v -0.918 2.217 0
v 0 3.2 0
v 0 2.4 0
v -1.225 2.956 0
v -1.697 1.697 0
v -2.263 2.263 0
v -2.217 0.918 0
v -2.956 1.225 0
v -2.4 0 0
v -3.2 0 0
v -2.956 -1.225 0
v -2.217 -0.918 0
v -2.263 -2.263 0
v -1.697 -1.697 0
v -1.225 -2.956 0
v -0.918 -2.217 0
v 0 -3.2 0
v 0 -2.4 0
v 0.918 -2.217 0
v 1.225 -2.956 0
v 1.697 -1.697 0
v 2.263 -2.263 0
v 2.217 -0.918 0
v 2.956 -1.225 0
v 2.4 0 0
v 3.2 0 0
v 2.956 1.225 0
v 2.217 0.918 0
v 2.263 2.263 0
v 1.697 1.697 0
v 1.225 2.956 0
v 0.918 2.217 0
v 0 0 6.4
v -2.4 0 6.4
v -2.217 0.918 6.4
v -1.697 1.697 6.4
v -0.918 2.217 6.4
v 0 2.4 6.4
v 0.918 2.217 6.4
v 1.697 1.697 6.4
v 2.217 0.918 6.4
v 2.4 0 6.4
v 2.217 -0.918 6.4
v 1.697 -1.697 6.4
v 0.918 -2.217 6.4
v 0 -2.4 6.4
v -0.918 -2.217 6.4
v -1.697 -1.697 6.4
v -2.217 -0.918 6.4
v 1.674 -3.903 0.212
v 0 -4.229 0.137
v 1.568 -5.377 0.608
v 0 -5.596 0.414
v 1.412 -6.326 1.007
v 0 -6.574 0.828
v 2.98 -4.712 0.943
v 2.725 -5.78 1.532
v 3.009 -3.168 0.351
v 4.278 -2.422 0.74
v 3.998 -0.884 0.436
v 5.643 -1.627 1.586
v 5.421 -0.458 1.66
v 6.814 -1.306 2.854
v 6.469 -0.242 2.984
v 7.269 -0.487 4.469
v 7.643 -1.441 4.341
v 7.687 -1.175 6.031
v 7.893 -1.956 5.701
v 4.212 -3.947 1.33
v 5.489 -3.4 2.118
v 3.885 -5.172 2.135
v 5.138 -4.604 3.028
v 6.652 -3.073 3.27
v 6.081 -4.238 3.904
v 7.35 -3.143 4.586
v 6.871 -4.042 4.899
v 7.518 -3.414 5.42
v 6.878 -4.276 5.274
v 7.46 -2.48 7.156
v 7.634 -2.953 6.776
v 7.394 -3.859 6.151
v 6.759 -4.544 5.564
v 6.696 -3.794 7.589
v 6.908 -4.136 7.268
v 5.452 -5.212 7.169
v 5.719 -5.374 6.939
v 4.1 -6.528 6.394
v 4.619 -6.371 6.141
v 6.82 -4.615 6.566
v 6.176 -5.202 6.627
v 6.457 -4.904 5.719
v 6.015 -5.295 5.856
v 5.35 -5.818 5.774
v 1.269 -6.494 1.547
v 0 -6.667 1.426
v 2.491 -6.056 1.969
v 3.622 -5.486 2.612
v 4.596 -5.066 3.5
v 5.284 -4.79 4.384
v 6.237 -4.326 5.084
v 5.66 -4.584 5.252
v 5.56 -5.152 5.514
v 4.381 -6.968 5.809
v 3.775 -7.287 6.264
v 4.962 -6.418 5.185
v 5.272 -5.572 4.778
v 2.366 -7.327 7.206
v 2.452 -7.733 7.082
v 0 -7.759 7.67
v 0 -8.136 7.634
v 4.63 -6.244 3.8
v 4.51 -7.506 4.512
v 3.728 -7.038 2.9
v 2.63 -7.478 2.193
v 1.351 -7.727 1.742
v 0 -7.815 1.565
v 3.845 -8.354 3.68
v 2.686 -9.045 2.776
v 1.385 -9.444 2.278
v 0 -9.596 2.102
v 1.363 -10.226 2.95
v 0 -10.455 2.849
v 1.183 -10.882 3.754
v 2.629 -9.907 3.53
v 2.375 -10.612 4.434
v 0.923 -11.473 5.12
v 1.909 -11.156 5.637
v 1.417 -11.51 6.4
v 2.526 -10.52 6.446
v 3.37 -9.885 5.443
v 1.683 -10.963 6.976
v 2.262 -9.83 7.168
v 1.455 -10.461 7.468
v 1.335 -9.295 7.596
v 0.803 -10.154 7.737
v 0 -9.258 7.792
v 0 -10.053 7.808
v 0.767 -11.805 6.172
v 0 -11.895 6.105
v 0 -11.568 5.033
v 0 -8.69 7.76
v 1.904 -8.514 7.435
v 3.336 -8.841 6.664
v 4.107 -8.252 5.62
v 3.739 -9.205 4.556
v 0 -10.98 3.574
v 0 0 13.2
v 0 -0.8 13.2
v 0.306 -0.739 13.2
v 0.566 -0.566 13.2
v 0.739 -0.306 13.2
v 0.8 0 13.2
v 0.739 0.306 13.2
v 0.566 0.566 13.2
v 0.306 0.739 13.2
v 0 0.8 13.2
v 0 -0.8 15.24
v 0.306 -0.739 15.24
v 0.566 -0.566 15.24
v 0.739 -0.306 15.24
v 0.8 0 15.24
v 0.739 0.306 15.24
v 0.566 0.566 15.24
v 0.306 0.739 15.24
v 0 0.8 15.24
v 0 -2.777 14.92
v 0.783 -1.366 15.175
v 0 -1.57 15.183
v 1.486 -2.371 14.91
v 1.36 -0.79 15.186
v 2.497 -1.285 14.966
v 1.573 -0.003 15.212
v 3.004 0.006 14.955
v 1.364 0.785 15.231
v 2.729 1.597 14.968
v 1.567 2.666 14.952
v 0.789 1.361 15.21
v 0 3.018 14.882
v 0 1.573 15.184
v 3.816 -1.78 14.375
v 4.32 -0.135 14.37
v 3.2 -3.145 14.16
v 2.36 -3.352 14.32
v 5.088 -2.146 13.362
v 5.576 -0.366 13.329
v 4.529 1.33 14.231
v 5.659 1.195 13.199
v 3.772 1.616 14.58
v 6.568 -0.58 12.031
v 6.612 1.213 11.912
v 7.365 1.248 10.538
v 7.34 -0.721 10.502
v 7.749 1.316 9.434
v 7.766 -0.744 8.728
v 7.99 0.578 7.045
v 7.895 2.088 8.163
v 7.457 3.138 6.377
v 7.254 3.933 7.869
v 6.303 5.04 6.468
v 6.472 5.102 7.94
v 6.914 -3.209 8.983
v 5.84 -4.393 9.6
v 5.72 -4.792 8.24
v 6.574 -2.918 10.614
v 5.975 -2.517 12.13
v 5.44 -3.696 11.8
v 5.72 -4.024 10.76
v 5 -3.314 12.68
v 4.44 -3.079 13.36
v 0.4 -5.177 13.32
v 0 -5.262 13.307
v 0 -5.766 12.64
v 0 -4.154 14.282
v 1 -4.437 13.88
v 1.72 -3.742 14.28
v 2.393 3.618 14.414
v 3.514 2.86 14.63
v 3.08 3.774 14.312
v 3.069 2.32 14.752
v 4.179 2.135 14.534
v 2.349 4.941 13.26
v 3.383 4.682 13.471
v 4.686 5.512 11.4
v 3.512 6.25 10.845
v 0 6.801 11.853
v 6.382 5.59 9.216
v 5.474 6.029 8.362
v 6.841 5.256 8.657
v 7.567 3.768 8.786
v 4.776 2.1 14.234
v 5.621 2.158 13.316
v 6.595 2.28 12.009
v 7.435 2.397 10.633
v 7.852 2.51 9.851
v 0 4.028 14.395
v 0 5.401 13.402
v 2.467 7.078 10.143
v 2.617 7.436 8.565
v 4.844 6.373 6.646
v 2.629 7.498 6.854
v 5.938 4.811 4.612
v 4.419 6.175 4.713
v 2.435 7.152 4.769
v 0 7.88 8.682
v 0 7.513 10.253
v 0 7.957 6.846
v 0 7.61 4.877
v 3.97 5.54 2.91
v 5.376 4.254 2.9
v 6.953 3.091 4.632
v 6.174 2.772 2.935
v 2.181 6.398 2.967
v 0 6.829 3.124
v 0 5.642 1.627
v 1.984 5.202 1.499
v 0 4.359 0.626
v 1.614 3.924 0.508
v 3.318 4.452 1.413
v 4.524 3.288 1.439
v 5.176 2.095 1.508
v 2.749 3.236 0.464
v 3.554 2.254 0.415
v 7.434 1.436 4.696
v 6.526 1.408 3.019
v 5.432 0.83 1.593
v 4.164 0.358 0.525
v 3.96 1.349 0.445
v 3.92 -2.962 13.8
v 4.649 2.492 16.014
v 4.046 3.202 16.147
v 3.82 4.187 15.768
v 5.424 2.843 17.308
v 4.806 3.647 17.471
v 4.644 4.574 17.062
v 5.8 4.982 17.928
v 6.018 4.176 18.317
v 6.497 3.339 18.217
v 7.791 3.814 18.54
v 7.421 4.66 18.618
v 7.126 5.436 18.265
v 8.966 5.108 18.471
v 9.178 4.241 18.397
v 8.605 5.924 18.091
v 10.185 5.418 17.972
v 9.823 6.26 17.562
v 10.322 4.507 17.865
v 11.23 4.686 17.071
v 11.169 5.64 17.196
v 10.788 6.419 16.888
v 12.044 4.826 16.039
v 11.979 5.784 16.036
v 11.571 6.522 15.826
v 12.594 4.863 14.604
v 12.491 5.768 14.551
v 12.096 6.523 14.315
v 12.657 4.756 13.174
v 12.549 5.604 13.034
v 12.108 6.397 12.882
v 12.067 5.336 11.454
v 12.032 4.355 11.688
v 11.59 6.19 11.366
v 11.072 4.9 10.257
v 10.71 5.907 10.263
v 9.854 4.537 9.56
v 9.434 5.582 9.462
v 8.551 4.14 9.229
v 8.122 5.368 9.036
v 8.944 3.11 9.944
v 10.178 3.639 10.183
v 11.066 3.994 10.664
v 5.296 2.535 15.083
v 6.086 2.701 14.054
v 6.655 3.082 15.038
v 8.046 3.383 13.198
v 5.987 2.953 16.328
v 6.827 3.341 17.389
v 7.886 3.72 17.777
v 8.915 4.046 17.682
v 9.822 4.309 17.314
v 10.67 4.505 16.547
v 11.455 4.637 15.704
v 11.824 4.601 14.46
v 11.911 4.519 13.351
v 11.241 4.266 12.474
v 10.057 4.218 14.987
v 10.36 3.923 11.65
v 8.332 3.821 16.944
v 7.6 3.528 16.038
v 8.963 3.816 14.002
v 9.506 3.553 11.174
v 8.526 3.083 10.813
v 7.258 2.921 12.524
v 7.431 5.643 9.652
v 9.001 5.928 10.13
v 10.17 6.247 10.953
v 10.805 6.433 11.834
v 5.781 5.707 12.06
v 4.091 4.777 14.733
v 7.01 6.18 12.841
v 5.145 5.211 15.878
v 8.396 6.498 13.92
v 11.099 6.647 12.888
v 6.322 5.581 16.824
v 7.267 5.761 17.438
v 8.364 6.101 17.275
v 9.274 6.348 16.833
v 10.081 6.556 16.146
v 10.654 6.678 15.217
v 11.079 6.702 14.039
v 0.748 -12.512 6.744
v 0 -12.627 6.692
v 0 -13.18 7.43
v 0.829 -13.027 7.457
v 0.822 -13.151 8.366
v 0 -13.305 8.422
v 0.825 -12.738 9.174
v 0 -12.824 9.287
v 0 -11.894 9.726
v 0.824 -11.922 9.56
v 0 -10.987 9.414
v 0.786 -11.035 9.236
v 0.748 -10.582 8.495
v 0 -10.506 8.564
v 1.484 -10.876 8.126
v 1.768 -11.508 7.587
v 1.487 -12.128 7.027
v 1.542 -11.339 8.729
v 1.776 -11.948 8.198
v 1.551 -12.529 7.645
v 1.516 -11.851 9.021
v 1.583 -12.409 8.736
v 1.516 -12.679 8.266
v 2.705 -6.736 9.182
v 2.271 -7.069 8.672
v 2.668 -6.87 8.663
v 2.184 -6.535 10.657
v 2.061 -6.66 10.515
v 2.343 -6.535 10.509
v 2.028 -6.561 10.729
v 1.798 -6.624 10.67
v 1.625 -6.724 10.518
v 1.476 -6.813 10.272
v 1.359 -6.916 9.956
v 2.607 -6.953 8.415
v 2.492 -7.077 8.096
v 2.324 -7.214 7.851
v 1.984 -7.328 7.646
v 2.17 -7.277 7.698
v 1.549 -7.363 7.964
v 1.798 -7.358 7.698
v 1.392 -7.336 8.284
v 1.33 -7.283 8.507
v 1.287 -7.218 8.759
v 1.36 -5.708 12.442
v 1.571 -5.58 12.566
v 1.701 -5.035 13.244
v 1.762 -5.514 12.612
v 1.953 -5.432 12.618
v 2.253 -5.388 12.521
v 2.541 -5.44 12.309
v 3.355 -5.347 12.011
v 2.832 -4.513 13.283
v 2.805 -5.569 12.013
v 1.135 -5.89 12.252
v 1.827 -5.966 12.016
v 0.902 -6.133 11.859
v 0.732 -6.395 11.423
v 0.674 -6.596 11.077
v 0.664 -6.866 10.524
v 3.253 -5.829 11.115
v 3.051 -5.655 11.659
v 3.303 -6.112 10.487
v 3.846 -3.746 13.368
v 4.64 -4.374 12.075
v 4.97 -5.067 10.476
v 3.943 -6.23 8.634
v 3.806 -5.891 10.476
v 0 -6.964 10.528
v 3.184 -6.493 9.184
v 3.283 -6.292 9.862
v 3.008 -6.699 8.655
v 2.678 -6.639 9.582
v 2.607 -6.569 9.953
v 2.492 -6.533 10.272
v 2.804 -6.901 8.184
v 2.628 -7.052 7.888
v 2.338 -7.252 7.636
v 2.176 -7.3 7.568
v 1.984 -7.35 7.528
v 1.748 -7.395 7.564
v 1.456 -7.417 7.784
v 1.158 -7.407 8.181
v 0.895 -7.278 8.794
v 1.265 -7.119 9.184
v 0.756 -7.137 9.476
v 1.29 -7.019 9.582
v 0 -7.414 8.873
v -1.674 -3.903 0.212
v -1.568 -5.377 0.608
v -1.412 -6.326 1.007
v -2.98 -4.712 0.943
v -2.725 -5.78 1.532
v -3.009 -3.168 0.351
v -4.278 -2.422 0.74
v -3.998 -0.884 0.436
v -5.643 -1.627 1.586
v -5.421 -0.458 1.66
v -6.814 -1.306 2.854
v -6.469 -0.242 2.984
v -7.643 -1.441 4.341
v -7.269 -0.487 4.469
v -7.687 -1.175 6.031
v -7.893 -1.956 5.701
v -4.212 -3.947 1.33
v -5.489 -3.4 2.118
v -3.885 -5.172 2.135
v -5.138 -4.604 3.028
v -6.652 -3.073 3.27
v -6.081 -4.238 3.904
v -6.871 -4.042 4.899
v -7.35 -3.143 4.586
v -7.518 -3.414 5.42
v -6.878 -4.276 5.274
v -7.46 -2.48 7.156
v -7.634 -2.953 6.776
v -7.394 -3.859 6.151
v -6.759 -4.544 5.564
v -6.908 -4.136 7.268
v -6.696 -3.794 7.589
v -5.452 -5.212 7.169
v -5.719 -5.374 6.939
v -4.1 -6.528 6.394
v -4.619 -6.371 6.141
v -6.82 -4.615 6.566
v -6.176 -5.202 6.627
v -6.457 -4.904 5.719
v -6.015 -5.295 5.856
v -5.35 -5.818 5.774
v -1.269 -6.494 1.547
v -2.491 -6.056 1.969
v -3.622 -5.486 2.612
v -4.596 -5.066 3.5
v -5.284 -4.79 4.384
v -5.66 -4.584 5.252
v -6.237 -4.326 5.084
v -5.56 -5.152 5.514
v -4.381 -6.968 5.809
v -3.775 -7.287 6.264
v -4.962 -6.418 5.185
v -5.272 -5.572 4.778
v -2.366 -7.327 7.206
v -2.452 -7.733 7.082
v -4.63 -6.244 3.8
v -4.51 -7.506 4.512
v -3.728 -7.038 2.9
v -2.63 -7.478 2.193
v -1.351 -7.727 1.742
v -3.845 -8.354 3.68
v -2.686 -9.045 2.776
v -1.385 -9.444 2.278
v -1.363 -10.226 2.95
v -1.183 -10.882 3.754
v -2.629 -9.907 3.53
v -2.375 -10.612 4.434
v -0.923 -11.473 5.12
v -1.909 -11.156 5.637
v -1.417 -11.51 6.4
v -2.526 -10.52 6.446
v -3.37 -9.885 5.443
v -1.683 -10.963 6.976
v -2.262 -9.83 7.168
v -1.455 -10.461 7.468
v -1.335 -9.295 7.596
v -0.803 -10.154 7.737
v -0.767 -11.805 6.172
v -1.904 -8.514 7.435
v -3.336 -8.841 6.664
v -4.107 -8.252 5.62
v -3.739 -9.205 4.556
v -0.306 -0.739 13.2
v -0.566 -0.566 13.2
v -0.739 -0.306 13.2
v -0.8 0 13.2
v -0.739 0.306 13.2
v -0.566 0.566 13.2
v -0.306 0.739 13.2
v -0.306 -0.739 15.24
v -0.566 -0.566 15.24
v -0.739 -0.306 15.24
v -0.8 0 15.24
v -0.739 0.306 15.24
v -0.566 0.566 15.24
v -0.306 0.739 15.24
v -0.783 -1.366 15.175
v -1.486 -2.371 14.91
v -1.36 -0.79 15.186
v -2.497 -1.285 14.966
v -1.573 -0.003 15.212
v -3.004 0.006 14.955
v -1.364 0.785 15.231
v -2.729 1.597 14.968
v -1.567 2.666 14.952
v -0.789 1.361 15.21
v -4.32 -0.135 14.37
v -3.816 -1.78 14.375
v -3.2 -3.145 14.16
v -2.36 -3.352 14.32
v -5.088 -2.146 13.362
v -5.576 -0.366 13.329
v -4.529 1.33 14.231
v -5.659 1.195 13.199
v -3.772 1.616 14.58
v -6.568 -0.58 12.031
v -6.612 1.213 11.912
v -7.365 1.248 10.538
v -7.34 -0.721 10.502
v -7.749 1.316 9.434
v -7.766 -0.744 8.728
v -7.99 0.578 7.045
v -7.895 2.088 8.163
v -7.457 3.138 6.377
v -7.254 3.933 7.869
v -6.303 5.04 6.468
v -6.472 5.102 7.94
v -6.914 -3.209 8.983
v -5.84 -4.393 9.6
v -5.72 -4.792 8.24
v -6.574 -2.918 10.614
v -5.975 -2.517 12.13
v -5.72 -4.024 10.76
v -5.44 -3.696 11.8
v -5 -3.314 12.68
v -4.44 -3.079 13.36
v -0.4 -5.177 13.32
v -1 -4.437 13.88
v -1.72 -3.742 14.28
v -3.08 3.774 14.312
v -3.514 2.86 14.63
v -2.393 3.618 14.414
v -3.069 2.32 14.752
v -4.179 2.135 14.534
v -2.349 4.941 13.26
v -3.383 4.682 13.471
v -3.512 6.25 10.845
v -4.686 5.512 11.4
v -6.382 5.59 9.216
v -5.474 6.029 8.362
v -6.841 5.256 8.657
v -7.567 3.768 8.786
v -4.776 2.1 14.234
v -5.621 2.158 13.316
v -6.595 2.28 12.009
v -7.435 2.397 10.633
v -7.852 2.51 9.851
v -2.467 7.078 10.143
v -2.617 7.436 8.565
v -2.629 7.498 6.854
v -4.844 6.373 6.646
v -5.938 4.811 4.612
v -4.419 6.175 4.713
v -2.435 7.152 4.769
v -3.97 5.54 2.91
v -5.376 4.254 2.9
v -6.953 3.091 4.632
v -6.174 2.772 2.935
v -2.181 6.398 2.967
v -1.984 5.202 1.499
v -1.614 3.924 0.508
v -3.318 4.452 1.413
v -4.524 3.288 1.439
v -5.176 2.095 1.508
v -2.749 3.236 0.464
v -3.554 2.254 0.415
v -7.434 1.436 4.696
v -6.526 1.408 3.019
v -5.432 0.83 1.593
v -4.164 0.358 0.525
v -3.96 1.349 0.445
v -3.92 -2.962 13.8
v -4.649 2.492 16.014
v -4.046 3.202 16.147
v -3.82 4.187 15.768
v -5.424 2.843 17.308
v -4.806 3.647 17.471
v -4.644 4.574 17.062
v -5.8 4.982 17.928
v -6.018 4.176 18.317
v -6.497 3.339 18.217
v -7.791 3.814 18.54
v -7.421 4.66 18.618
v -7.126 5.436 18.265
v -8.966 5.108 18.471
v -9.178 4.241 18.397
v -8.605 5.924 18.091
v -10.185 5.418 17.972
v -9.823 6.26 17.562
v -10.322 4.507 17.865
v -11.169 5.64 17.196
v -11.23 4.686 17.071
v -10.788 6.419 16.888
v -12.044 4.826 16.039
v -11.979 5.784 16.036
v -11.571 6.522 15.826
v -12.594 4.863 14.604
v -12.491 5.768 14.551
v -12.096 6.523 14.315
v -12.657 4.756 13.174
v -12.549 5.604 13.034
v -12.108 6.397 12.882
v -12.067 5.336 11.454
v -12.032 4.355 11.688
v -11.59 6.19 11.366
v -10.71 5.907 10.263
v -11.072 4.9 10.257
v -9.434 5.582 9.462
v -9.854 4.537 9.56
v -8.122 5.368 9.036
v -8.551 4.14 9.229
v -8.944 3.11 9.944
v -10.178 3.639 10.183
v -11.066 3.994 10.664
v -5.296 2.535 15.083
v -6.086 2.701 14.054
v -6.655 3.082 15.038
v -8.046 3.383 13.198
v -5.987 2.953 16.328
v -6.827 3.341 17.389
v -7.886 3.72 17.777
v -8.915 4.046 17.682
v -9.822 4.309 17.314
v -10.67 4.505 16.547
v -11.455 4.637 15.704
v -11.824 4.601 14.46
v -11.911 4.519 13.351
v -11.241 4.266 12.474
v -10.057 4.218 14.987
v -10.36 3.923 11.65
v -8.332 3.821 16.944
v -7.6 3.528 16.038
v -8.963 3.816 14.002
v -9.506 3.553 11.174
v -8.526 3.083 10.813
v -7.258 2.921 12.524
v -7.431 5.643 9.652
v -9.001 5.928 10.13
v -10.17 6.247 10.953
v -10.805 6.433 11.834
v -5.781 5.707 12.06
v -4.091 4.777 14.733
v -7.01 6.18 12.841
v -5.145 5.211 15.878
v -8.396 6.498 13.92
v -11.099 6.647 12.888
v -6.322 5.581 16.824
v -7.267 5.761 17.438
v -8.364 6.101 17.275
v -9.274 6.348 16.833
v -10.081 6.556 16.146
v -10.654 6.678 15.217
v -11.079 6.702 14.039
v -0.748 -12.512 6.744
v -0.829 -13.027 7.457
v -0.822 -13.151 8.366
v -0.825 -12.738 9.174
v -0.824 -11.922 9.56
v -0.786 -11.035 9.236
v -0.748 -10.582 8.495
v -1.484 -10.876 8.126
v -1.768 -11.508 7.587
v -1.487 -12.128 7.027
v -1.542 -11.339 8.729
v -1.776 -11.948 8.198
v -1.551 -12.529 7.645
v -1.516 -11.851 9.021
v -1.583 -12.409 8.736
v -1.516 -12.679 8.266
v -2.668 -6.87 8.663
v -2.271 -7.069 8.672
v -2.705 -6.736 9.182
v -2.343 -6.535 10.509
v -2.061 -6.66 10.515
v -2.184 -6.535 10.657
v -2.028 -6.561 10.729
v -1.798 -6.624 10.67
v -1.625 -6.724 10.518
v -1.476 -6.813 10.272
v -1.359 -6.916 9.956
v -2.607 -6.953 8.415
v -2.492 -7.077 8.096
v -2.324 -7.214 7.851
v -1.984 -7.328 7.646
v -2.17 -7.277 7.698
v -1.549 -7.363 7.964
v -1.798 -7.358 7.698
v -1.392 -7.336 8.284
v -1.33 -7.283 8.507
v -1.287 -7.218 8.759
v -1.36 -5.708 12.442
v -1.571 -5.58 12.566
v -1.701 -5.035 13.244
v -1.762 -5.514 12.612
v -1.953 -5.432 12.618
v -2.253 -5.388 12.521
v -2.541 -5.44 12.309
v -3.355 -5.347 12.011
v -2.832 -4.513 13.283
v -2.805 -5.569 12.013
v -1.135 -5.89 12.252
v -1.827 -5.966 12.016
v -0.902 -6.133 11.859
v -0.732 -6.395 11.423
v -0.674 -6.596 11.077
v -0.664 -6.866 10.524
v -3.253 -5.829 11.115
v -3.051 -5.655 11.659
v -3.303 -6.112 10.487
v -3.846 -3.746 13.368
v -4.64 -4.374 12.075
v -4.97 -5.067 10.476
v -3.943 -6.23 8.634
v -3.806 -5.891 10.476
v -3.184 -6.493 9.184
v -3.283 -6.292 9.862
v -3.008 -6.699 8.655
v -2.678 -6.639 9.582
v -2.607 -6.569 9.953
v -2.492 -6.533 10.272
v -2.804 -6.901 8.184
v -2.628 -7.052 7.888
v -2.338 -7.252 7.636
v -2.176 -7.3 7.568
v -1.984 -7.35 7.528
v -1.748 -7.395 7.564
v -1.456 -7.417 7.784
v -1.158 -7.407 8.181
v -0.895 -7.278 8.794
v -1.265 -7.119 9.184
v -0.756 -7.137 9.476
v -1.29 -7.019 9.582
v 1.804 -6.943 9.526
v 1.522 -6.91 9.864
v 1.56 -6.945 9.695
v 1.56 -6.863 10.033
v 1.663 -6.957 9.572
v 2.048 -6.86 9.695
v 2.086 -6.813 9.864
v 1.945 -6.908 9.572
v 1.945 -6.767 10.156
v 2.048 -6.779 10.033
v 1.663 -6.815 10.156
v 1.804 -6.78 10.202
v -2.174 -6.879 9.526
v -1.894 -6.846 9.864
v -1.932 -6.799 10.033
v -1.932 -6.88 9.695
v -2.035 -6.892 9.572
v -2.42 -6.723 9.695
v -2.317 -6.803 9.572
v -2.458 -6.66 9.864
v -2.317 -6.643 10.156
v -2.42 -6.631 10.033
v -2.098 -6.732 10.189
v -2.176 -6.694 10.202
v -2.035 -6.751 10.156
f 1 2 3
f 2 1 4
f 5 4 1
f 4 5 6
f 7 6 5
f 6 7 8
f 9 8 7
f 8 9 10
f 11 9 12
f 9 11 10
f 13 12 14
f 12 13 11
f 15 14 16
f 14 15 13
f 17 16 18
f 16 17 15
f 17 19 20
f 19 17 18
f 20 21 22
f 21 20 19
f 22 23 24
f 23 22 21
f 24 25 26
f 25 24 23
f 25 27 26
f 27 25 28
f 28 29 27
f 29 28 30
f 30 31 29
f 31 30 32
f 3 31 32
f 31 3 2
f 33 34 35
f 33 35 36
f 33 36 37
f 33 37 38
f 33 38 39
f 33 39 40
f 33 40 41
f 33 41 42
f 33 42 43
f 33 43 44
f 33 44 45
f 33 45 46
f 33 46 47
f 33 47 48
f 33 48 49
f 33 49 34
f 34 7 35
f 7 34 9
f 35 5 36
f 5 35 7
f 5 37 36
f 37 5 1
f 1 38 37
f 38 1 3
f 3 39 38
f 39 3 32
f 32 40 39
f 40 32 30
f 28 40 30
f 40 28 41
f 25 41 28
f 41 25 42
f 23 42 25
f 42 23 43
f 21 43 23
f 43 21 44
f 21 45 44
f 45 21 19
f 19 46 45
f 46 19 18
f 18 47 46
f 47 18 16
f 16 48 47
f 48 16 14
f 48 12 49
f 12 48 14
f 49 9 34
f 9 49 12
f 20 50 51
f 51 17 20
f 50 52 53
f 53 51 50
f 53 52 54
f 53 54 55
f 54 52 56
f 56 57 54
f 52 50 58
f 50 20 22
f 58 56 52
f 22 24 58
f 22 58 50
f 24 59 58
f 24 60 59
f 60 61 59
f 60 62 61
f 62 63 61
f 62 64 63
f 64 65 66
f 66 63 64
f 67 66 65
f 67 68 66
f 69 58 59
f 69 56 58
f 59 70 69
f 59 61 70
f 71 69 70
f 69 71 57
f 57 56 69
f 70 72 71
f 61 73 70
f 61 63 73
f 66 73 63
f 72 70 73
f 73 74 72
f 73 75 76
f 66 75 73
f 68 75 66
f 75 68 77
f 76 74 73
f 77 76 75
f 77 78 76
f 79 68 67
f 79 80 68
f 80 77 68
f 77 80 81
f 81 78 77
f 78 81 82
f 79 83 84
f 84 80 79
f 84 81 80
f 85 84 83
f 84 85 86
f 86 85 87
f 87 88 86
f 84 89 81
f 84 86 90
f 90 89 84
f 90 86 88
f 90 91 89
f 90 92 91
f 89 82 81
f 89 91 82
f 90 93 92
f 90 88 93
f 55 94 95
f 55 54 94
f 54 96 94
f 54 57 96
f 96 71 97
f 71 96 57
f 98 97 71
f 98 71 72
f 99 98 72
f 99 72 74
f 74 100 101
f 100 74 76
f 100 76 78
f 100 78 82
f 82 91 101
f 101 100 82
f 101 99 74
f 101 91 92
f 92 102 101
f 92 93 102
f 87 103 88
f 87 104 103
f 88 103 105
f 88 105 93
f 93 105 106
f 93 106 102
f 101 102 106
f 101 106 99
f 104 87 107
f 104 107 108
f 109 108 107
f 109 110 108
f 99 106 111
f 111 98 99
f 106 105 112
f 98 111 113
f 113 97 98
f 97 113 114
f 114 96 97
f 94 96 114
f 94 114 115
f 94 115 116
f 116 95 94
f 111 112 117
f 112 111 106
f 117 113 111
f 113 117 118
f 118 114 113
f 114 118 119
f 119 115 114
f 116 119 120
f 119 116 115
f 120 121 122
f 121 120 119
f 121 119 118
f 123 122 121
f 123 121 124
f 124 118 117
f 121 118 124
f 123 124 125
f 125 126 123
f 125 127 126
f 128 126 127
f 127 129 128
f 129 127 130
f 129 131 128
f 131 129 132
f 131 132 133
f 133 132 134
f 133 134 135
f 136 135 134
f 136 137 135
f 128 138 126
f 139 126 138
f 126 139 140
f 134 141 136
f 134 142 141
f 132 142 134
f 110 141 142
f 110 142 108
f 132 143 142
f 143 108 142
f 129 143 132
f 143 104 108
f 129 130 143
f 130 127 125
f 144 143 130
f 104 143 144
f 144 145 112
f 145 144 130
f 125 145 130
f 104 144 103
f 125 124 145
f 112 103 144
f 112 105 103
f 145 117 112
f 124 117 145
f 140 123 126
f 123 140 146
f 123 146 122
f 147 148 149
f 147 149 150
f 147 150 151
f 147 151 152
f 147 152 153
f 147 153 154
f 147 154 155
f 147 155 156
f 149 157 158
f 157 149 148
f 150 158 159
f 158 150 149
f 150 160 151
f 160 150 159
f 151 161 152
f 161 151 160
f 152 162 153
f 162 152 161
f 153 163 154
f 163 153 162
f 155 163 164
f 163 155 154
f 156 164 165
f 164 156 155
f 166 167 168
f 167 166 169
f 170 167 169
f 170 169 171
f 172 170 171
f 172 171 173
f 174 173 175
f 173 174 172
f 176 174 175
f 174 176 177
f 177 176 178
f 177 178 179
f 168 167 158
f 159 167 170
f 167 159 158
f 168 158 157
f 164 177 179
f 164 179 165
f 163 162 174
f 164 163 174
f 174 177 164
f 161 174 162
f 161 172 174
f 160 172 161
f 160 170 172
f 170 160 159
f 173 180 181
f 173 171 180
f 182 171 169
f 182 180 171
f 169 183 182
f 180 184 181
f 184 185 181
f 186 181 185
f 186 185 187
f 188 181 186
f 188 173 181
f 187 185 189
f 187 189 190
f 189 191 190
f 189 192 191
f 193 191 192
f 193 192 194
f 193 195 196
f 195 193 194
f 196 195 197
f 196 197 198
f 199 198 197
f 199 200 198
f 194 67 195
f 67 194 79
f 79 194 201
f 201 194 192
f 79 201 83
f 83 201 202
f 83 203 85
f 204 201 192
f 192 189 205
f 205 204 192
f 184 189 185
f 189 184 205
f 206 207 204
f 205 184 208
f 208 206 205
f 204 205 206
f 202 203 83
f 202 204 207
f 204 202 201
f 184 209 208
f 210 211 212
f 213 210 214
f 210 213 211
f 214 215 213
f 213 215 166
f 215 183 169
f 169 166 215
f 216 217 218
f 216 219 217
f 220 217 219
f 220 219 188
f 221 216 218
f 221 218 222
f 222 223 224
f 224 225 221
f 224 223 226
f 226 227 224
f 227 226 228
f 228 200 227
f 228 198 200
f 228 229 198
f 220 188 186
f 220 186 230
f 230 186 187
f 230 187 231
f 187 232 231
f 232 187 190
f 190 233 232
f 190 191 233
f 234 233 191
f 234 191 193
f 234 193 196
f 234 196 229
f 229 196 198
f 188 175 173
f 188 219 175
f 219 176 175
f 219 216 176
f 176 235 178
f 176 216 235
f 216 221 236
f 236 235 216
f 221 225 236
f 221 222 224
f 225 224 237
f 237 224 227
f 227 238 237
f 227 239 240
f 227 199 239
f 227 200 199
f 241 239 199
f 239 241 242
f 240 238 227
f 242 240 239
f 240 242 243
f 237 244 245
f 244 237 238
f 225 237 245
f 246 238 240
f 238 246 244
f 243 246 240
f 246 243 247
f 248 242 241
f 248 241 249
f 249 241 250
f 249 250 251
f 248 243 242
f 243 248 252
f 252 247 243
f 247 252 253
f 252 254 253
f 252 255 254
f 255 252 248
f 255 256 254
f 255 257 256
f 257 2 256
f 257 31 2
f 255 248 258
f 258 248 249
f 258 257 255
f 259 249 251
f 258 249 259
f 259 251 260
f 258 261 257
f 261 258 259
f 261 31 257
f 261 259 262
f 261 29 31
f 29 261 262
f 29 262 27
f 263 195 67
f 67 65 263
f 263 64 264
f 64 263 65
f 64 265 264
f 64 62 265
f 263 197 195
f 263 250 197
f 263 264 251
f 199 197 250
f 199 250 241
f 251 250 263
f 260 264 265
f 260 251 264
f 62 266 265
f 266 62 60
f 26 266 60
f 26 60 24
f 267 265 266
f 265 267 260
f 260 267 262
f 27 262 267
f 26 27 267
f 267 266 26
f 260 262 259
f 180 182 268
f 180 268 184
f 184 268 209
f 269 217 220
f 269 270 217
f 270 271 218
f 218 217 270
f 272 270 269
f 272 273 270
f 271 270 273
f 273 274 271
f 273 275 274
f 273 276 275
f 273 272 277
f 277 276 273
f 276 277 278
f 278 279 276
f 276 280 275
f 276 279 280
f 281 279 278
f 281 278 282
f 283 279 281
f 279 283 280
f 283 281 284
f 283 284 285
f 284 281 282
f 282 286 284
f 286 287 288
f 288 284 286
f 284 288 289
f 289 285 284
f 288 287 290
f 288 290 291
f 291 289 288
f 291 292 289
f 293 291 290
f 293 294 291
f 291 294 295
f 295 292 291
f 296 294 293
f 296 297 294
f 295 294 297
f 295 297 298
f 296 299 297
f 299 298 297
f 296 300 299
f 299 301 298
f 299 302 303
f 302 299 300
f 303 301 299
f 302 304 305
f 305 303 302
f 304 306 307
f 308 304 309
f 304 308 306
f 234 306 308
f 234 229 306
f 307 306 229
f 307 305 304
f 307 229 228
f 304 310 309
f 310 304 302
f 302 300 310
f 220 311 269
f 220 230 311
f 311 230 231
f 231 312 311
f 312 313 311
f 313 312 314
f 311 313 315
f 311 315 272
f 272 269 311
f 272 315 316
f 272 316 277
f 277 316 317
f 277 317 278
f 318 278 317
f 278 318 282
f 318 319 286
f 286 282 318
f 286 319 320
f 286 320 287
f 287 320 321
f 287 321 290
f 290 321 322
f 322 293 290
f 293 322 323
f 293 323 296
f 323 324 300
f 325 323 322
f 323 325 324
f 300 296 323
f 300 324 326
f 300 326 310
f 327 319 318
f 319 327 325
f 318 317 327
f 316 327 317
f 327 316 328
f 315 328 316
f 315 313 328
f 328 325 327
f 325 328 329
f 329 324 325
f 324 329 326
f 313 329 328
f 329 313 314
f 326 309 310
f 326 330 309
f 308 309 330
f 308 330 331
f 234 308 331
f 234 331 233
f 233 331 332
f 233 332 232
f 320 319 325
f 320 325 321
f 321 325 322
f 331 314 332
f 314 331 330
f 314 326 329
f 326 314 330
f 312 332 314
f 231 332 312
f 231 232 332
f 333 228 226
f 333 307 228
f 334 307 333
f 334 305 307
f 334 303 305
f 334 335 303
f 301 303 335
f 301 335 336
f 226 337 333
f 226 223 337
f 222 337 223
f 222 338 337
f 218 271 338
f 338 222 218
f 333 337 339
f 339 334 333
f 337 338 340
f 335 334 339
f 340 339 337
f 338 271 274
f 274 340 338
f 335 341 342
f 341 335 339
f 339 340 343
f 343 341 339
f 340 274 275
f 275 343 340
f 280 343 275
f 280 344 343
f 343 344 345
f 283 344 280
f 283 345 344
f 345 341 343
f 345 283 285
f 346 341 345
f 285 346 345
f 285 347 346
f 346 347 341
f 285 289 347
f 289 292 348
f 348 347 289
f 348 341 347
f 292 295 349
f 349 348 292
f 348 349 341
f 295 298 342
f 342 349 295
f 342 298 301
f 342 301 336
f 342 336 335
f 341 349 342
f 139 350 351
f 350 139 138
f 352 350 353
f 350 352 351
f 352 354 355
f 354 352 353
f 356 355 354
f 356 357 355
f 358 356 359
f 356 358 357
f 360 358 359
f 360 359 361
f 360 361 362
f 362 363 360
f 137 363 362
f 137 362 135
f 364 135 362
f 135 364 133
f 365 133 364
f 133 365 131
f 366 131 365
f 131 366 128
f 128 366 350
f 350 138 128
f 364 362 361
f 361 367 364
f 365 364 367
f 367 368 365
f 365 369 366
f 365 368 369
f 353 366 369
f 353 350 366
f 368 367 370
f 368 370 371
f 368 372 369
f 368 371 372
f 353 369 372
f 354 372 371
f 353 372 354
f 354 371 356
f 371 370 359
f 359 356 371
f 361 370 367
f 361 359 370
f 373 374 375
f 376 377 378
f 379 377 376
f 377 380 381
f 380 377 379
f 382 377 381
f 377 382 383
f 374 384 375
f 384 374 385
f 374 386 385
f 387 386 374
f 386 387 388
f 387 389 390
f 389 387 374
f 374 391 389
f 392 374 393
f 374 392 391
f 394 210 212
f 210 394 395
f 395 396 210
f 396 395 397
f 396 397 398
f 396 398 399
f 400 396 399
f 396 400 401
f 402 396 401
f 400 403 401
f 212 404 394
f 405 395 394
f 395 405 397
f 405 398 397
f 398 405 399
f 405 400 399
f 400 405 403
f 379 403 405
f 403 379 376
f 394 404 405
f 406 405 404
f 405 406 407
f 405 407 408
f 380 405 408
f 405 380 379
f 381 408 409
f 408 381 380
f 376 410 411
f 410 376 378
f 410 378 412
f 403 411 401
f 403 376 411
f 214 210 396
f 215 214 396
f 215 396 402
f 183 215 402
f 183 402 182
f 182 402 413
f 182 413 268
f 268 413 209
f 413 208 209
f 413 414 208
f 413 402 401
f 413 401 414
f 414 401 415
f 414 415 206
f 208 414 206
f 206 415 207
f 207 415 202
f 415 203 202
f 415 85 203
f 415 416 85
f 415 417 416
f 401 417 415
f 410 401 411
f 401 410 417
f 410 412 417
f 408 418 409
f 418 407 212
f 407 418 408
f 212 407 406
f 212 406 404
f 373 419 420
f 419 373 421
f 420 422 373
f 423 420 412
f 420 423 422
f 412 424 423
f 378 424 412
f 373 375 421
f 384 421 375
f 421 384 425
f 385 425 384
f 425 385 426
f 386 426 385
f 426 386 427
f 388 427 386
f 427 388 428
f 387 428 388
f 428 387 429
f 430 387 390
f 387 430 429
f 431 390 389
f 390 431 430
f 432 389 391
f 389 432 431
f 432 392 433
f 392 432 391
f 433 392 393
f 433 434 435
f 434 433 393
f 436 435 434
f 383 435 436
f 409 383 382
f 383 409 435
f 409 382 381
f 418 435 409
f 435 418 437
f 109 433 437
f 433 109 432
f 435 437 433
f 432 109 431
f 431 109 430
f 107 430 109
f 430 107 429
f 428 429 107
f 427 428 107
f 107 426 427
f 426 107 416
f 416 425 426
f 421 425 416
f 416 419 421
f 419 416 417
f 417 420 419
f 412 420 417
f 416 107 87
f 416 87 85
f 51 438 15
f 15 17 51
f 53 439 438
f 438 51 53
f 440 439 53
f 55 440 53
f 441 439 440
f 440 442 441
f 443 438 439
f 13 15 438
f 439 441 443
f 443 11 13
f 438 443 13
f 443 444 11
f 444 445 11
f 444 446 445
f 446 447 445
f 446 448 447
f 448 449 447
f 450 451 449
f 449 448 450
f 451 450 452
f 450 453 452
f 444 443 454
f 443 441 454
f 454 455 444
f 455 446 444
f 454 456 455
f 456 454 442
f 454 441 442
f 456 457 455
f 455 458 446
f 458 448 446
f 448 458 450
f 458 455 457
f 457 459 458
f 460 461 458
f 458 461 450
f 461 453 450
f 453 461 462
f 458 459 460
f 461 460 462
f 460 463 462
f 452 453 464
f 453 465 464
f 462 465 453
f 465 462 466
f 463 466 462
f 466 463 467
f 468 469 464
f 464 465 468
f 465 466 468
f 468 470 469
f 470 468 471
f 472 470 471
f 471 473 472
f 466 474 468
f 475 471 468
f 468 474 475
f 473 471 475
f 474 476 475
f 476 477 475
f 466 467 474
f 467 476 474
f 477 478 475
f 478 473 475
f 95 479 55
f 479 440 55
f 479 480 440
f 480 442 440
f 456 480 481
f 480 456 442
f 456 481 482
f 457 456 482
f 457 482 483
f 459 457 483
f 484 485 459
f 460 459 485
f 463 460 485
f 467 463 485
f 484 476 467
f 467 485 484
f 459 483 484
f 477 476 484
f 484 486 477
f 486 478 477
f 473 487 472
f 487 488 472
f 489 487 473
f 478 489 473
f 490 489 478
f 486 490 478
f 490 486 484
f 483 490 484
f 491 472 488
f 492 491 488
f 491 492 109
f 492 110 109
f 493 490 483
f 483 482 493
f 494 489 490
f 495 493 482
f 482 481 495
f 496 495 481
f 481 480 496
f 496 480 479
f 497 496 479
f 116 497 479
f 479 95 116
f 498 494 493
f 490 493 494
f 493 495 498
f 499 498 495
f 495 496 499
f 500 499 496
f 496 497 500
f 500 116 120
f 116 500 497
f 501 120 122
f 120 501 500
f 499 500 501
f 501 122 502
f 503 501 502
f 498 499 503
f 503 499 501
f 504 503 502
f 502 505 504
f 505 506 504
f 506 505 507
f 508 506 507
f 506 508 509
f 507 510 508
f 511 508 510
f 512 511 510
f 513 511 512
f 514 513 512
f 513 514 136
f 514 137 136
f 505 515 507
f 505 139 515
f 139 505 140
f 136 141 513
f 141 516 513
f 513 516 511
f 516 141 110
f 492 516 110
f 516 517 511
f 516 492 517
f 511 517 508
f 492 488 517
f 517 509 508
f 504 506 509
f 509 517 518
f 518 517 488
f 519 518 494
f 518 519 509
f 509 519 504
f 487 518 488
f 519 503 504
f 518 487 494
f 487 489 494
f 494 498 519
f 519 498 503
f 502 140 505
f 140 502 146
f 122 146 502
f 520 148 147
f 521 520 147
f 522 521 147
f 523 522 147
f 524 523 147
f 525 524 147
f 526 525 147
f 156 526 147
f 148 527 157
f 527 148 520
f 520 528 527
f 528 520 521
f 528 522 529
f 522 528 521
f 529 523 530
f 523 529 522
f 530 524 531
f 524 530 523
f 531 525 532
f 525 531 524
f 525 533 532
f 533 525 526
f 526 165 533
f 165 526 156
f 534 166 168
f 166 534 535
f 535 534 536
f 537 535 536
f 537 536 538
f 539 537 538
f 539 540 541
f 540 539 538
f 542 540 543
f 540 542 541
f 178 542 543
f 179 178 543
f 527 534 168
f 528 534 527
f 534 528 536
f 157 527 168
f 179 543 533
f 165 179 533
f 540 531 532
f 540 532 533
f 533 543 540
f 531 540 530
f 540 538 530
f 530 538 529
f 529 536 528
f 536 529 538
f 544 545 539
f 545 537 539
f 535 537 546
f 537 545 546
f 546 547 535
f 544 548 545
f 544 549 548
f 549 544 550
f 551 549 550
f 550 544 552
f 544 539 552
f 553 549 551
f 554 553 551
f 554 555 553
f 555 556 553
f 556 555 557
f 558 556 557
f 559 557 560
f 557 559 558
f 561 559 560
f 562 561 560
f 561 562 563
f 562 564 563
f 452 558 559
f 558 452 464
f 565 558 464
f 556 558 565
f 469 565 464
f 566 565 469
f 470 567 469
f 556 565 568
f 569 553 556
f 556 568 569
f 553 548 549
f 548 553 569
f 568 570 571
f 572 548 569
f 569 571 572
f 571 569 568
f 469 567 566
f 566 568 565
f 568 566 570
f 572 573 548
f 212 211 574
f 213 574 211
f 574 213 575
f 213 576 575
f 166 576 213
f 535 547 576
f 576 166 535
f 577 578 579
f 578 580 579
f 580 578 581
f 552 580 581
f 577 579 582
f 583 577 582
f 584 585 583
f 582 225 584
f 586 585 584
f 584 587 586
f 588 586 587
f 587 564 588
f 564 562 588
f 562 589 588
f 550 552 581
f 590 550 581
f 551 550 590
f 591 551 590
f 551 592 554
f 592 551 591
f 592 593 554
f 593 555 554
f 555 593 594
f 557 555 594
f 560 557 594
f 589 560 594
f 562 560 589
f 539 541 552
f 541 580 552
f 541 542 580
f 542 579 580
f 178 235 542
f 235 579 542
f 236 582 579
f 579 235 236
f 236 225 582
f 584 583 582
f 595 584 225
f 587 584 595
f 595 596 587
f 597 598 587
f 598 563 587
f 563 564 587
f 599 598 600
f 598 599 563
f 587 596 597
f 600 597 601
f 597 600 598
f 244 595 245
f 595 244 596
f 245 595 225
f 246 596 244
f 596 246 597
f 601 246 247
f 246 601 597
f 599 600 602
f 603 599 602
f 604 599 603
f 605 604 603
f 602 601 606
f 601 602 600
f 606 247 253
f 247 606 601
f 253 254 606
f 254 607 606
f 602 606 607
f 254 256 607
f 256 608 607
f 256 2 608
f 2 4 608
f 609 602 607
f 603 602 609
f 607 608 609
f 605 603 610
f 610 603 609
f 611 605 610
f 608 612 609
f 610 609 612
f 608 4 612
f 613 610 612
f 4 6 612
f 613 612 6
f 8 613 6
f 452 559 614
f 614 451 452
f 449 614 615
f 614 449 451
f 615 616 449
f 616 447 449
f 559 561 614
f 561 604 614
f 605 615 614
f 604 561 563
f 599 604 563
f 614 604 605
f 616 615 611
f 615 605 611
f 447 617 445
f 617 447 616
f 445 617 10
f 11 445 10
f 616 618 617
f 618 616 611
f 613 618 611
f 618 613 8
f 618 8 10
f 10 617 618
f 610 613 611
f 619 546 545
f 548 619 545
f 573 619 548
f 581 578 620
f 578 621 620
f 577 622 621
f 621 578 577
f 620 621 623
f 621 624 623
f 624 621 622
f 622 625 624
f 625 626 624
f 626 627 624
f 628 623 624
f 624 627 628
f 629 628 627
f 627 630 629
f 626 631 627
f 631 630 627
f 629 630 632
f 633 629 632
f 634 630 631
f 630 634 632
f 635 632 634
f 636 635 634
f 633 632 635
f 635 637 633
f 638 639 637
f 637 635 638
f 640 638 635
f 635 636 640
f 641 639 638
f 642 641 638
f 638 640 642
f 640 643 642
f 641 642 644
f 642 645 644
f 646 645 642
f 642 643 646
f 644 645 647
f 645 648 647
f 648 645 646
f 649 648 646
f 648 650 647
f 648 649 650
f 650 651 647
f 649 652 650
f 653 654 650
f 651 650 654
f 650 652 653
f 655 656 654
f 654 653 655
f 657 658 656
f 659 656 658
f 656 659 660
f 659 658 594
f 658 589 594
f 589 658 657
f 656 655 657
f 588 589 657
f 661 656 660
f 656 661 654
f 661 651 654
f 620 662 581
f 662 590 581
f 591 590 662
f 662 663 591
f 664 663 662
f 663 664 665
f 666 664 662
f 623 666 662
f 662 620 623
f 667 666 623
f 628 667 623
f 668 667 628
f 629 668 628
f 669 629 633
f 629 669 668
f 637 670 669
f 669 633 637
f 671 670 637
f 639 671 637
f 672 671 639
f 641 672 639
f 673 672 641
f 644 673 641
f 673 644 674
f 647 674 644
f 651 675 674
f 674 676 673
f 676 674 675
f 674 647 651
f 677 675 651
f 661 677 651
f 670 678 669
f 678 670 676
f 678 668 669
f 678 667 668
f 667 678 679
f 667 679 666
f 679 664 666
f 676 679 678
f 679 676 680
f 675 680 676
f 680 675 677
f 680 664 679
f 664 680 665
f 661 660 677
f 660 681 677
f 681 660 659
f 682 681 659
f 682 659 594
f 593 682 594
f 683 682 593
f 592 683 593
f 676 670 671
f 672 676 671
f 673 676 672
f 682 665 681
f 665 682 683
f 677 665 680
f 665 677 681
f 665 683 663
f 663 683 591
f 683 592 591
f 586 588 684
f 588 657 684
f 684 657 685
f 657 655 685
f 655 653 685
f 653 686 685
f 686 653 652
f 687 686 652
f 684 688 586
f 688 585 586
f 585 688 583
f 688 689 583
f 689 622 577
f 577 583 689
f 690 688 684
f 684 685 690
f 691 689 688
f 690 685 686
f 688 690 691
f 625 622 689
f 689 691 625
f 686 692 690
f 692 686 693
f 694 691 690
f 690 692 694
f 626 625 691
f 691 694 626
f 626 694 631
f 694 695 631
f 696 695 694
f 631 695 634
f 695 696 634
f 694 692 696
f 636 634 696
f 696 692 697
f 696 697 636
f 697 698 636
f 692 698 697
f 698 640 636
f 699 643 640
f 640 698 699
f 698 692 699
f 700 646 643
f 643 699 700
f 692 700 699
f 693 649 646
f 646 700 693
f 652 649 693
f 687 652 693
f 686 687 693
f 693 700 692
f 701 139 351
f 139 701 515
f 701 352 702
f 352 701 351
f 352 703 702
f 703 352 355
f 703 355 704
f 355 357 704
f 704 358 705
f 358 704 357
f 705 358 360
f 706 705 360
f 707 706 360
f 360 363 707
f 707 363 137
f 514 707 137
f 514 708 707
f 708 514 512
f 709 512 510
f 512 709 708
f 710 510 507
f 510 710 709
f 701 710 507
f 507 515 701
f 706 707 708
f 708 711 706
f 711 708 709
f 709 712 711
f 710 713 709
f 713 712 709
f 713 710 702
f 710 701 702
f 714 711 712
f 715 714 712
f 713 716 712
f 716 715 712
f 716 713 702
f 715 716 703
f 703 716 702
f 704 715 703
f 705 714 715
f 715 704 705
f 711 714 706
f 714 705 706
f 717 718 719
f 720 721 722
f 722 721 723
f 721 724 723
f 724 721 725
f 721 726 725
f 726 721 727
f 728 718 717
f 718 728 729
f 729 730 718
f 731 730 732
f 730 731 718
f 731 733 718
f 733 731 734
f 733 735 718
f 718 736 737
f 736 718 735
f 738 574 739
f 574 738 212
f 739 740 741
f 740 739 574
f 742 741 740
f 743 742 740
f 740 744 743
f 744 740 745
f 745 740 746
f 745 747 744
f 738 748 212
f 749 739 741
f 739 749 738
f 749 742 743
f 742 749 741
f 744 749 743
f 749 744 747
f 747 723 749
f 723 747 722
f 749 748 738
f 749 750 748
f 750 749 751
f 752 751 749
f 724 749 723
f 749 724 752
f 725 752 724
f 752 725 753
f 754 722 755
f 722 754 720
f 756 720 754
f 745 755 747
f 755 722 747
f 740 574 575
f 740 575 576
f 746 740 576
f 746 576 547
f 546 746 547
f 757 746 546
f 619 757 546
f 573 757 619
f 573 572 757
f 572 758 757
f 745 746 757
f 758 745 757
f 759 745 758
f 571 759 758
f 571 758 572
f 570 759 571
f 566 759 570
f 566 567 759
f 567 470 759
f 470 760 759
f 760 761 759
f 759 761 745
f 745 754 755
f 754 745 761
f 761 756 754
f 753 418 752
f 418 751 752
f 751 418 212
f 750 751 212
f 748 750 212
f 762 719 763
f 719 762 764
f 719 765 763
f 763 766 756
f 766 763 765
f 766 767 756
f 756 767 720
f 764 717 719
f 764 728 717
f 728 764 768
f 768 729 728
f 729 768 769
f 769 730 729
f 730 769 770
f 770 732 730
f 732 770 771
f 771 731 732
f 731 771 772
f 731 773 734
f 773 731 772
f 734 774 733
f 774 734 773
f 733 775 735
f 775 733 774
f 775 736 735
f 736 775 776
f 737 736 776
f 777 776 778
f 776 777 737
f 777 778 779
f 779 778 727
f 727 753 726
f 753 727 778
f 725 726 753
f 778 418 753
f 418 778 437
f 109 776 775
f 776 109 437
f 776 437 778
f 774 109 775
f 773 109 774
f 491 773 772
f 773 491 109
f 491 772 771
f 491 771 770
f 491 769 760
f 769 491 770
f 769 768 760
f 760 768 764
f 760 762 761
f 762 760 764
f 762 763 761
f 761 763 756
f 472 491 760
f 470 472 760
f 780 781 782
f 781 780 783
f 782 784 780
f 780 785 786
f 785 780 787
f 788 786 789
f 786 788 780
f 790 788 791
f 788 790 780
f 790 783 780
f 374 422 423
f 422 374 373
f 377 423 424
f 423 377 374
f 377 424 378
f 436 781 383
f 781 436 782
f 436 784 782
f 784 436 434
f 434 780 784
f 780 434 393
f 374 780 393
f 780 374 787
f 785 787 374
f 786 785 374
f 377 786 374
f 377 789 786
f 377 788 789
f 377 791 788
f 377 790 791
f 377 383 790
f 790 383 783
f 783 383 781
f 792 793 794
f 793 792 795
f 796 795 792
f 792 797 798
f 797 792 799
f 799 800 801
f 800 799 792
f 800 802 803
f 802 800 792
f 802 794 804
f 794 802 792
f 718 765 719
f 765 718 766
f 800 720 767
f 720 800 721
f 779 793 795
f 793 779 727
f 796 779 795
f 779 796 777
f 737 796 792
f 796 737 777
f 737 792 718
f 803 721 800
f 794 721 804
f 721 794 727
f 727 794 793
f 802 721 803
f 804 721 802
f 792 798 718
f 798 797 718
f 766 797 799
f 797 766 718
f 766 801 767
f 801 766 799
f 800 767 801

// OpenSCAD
use <../lib.scad>
use <s/24629p01s05.scad>
use <s/24629p01s06.scad>
use <s/24629s01.scad>
use <s/24629s02.scad>
use <s/24629s03.scad>
use <s/24629s04.scad>
use <../p/stud4o.scad>
function ldraw_lib__24629p01() = [
// 0 Minifig Head Mouse with Black Ears, Nose and Skull and Eyes with Black Pupil with White Highlight Pattern
// 0 Name: 24629p01.dat
// 0 Author: Philippe Hurbain [Philo]
// 0 !LDRAW_ORG Part UPDATE 2024-05
// 0 !LICENSE Licensed under CC BY 4.0 : see CAreadme.txt
// 
// 0 BFC CERTIFY CCW
  [0,"BFC","CERTIFY"],
  [0,"BFC","CCW"],
// 
// 0 !KEYWORDS Bricklink 24629pb01, Disney, Mickey, Rebrickable 24629pr0001
// 0 !KEYWORDS Set 10775, set 71040, Set 71044
// 
// 0 !HISTORY 2022-02-06 {LEGO Instructions App} Original part shape
// 0 !HISTORY 2022-02-07 [Philo] File preparation for LDraw Parts Tracker
// 0 !HISTORY 2024-06-30 [OrionP] Official Update 2024-05
// 
// 
// 1 16 0 -16 0 1 0 0 0 -4 0 0 0 1 stud4o.dat
  [1,16,0,-16,0,1,0,0,0,-4,0,0,0,1, ldraw_lib__stud4o()],
// 1 16 0 0 0 1 0 0 0 1 0 0 0 1 s\24629s01.dat
  [1,16,0,0,0,1,0,0,0,1,0,0,0,1, ldraw_lib__s__24629s01()],
// 1 0 0 0 0 1 0 0 0 1 0 0 0 1 s\24629s02.dat
  [1,0,0,0,0,1,0,0,0,1,0,0,0,1, ldraw_lib__s__24629s02()],
// 1 0 0 0 0 1 0 0 0 1 0 0 0 1 s\24629s03.dat
  [1,0,0,0,0,1,0,0,0,1,0,0,0,1, ldraw_lib__s__24629s03()],
// 1 0 0 0 0 1 0 0 0 1 0 0 0 1 s\24629s04.dat
  [1,0,0,0,0,1,0,0,0,1,0,0,0,1, ldraw_lib__s__24629s04()],
// 1 16 0 0 0 1 0 0 0 1 0 0 0 1 s\24629p01s05.dat
  [1,16,0,0,0,1,0,0,0,1,0,0,0,1, ldraw_lib__s__24629p01s05()],
// 1 16 0 0 0 -1 0 0 0 1 0 0 0 1 s\24629s01.dat
  [1,16,0,0,0,-1,0,0,0,1,0,0,0,1, ldraw_lib__s__24629s01()],
// 1 0 0 0 0 -1 0 0 0 1 0 0 0 1 s\24629s02.dat
  [1,0,0,0,0,-1,0,0,0,1,0,0,0,1, ldraw_lib__s__24629s02()],
// 1 0 0 0 0 -1 0 0 0 1 0 0 0 1 s\24629s03.dat
  [1,0,0,0,0,-1,0,0,0,1,0,0,0,1, ldraw_lib__s__24629s03()],
// 1 0 0 0 0 -1 0 0 0 1 0 0 0 1 s\24629s04.dat
  [1,0,0,0,0,-1,0,0,0,1,0,0,0,1, ldraw_lib__s__24629s04()],
// 1 16 0 0 0 -1 0 0 0 1 0 0 0 1 s\24629p01s05.dat
  [1,16,0,0,0,-1,0,0,0,1,0,0,0,1, ldraw_lib__s__24629p01s05()],
// 1 15 0 0 0 1 0 0 0 1 0 0 0 1 s\24629p01s06.dat
  [1,15,0,0,0,1,0,0,0,1,0,0,0,1, ldraw_lib__s__24629p01s06()],
];
module ldraw_lib__24629p01(step=0, col=false, unit=2/5, alt=false, line=0.2, solid=!$preview)
    makepoly(ldraw_lib__24629p01(), step=step, col=col, unit=unit, alt=alt, line=line, solid=solid);
ldraw_lib__24629p01(line=0.2);
